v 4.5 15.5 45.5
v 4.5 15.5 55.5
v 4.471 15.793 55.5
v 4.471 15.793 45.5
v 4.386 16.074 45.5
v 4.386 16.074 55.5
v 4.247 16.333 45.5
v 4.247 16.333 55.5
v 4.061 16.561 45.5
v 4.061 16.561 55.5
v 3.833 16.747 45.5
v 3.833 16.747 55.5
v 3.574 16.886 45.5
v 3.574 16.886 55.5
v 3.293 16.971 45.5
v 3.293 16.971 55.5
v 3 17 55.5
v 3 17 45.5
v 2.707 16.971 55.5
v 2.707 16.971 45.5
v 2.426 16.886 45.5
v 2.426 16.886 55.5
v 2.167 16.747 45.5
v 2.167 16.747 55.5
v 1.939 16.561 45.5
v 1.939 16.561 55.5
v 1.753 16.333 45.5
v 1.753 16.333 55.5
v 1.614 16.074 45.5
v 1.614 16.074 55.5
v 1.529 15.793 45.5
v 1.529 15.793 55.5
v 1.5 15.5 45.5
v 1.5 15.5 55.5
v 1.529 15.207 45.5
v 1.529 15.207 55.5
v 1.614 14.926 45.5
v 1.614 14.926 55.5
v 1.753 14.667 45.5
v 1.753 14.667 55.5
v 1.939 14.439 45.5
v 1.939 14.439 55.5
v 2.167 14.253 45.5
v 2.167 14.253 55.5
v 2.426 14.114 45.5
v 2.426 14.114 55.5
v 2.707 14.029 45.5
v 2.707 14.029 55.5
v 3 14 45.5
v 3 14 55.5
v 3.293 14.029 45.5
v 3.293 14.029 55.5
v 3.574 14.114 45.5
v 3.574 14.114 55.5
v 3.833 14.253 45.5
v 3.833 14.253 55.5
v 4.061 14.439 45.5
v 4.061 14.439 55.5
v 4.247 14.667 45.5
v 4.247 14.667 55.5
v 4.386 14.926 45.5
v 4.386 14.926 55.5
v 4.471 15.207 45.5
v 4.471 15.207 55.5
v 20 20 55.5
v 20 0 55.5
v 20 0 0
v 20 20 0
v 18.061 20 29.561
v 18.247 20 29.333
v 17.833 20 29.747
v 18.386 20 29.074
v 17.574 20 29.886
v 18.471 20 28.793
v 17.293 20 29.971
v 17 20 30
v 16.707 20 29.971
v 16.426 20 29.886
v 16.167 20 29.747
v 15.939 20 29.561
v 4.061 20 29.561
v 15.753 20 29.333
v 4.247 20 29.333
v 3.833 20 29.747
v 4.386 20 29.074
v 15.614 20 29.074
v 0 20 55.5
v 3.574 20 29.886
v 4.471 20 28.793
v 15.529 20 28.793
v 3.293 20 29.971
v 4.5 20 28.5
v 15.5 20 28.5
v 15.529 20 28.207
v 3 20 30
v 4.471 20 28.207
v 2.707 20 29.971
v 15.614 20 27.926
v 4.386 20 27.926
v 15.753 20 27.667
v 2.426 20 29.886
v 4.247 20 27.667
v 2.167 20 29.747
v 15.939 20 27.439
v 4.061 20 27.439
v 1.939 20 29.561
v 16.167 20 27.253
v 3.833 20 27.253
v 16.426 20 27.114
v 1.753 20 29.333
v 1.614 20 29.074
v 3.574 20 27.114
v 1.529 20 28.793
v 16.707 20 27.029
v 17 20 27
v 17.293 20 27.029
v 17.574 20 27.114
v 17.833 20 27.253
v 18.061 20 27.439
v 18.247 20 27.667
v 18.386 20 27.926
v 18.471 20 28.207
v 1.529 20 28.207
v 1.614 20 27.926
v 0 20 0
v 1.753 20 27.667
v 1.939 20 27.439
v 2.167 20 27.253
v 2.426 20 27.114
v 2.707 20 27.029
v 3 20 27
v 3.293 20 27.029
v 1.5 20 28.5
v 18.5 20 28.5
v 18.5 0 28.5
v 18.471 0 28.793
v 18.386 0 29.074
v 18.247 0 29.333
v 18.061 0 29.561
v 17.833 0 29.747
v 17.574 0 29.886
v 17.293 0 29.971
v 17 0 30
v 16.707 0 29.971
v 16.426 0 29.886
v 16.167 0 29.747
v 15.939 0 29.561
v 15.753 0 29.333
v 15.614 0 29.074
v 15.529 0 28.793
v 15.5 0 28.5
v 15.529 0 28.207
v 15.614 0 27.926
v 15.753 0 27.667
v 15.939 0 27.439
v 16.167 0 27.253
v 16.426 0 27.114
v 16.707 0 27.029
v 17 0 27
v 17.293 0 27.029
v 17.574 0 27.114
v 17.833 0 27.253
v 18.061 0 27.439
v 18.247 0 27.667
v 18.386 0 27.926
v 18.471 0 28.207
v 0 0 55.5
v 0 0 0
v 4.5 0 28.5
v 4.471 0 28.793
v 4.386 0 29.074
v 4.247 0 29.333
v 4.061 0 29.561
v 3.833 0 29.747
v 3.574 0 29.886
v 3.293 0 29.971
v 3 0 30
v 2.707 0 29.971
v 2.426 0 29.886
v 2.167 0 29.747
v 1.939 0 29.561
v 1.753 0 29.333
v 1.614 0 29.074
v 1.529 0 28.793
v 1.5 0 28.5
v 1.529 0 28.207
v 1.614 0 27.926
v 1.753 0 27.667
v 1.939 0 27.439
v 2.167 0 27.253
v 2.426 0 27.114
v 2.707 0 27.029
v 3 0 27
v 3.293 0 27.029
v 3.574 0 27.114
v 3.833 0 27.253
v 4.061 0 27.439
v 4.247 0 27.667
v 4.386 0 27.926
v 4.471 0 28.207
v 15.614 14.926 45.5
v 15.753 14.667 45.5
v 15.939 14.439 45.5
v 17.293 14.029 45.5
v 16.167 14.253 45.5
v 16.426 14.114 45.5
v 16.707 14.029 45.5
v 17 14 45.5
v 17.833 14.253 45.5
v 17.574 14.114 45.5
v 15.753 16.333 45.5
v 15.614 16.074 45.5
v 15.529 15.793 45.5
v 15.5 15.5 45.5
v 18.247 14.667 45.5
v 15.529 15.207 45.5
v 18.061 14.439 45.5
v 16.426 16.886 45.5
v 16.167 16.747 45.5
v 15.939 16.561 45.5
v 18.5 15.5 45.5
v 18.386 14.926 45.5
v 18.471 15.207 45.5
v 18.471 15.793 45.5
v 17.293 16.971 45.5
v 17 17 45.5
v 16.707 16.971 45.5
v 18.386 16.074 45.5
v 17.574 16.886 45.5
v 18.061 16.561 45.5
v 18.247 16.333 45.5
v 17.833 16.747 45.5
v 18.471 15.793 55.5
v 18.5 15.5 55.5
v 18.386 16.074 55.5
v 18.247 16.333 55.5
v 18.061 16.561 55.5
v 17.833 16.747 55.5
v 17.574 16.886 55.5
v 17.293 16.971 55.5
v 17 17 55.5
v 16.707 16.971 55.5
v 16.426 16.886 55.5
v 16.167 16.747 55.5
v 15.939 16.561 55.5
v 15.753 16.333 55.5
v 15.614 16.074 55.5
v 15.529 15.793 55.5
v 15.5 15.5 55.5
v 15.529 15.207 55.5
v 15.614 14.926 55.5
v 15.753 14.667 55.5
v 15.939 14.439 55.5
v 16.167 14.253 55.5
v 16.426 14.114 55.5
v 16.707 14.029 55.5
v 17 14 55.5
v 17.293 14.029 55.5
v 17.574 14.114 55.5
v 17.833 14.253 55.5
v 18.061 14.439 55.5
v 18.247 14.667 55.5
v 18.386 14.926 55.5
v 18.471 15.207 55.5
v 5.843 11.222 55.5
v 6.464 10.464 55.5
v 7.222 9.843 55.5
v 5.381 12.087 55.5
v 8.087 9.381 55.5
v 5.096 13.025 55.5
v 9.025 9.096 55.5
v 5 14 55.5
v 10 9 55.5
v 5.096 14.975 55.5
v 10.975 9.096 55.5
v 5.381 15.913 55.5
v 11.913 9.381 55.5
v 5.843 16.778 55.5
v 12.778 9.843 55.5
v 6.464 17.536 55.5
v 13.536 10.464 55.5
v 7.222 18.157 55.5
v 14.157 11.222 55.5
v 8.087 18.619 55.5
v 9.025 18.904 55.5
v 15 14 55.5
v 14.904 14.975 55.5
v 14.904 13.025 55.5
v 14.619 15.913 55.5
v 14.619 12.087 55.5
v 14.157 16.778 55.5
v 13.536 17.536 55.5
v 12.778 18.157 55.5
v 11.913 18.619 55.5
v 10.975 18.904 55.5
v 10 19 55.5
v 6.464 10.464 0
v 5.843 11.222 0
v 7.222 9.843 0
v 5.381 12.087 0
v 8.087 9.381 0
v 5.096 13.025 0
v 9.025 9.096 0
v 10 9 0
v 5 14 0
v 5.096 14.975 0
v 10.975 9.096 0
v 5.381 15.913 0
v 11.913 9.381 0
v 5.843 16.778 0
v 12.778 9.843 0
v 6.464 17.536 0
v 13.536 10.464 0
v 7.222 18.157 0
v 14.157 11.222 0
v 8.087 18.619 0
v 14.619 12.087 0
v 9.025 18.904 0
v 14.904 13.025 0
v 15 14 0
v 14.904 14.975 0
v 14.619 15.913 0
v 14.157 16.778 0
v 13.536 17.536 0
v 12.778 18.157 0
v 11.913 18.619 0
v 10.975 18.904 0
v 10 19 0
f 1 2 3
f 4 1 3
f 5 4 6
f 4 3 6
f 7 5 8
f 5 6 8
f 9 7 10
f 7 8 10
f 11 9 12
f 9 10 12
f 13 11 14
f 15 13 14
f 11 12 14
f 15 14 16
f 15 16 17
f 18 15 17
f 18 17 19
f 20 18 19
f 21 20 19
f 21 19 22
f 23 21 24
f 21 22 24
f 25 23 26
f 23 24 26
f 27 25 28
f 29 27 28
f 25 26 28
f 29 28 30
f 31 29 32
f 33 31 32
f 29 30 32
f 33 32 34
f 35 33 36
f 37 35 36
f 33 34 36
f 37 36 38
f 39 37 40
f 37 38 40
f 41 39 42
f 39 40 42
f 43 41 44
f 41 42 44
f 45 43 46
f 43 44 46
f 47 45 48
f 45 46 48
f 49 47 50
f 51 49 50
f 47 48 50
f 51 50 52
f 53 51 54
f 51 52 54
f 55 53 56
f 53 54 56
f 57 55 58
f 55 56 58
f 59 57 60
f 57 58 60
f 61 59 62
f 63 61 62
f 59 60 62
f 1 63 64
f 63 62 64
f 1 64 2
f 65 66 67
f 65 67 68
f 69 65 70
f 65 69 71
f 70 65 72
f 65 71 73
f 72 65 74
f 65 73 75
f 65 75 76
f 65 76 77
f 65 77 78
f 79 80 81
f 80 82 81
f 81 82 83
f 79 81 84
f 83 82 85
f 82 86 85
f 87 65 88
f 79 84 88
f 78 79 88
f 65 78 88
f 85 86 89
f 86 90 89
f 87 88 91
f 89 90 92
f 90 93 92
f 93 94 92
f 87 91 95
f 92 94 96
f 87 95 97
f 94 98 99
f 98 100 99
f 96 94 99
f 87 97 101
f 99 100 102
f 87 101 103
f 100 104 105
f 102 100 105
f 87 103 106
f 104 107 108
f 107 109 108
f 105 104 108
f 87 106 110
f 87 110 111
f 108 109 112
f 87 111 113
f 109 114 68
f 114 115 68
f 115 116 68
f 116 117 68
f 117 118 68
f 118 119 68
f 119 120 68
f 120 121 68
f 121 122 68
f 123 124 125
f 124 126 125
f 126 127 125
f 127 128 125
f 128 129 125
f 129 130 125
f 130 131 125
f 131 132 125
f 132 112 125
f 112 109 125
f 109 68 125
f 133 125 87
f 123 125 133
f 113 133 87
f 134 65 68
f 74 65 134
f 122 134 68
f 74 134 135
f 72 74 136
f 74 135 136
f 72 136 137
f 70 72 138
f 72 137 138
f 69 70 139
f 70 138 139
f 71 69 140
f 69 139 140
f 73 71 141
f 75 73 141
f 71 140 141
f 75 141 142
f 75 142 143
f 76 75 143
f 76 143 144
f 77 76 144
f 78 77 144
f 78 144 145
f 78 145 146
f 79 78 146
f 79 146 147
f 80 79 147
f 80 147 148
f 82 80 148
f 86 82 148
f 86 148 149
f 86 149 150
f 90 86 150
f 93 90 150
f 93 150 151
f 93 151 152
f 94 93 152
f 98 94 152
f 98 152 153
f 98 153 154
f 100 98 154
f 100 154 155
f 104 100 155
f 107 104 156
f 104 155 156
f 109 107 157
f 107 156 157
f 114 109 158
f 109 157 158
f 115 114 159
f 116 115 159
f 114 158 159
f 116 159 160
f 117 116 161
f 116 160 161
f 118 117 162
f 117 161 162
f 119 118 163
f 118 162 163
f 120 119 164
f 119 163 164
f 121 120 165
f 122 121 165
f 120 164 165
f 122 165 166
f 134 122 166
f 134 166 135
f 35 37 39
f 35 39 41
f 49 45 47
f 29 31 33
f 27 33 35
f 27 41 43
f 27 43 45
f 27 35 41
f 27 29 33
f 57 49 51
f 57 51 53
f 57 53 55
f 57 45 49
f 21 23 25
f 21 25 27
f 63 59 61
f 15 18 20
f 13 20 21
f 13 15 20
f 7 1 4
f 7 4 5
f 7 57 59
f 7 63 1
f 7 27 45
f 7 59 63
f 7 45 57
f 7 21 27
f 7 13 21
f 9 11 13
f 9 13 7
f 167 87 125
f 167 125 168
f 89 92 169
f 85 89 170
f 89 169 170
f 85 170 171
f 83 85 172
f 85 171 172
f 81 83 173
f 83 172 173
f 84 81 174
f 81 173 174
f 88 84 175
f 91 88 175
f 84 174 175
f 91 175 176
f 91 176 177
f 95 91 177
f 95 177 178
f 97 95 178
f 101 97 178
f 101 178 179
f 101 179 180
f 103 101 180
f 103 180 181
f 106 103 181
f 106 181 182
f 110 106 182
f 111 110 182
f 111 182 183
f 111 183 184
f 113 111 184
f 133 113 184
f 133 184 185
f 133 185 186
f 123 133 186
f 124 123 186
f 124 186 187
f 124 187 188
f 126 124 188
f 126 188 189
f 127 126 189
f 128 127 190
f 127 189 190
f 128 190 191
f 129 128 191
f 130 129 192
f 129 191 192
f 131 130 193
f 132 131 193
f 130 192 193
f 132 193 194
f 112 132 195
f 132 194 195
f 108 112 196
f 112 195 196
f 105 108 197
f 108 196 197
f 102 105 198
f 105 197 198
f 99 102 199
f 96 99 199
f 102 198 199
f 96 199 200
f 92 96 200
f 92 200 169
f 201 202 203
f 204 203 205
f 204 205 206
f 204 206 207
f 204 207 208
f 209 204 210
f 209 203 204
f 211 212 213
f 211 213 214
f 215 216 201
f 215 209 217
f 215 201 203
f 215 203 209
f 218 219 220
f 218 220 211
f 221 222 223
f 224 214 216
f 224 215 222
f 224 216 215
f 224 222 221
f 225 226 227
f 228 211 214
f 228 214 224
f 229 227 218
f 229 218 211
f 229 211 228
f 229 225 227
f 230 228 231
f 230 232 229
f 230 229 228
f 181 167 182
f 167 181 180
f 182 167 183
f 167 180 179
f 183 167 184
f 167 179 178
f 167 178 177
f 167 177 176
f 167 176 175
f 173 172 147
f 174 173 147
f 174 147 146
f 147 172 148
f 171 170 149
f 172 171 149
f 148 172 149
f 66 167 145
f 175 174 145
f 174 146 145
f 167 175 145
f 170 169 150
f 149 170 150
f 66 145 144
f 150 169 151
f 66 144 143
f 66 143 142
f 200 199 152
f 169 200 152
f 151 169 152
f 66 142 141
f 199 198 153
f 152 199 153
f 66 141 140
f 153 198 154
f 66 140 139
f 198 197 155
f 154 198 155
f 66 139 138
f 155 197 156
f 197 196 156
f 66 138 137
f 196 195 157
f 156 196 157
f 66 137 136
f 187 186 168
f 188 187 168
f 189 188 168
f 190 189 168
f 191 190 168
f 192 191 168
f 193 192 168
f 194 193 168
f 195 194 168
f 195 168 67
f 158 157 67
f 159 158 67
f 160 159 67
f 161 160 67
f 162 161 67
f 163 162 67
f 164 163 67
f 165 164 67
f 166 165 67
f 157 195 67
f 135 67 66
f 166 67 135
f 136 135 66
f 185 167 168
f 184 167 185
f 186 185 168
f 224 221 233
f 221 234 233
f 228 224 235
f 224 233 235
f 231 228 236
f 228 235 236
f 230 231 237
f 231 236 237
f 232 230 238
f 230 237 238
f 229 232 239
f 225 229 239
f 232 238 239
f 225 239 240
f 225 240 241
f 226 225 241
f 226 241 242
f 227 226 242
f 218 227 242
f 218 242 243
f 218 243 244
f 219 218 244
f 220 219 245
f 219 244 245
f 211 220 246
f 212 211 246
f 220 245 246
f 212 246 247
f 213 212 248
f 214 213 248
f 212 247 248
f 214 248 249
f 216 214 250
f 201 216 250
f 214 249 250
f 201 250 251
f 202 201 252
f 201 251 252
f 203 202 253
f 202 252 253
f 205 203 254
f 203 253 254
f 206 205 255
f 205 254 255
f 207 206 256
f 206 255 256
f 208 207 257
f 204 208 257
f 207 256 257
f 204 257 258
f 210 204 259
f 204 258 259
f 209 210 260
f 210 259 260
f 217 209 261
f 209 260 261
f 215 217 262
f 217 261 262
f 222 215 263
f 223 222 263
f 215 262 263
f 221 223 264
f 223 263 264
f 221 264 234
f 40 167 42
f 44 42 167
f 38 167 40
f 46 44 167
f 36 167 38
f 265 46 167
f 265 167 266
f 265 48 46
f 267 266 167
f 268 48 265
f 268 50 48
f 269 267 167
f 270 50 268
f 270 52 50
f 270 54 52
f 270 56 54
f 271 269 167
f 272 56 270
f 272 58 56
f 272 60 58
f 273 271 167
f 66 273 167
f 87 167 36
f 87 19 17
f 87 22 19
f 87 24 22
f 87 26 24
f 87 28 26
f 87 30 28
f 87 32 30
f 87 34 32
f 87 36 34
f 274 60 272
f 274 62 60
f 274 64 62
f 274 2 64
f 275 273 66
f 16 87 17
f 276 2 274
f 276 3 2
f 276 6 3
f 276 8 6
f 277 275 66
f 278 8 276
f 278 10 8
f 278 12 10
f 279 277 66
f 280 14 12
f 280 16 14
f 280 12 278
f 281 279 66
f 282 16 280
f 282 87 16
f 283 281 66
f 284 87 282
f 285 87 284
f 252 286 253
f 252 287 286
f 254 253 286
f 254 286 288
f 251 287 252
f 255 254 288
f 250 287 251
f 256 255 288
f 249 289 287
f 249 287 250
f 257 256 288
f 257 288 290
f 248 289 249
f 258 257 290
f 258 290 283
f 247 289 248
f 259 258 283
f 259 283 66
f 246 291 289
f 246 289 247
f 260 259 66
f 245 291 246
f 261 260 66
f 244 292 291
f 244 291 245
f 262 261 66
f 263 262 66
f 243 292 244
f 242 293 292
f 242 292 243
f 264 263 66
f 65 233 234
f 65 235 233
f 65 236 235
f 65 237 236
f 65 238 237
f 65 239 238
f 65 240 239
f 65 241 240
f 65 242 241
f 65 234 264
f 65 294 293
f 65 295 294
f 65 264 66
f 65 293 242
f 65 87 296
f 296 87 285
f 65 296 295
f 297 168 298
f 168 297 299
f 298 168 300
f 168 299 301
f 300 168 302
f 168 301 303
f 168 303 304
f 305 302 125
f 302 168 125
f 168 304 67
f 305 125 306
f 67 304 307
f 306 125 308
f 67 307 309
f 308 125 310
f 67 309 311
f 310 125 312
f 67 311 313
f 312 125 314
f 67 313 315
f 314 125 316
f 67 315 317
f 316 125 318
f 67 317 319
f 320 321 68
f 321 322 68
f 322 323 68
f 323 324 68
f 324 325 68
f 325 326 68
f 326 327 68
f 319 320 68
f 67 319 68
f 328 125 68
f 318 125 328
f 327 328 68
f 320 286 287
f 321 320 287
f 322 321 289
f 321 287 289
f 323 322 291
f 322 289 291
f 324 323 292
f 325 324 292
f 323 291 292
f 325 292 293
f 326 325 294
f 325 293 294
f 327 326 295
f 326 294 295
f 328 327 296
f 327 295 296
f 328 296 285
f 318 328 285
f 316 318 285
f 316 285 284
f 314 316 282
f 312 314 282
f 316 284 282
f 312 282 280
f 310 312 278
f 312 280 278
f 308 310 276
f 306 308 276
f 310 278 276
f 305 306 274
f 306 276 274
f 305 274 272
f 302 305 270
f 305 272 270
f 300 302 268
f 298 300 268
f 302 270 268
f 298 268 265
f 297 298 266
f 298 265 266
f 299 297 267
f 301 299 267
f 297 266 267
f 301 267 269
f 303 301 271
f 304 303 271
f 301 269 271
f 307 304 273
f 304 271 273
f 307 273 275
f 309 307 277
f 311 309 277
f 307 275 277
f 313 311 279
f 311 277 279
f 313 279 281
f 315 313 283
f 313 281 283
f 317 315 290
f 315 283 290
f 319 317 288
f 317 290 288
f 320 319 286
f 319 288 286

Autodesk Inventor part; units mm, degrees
ref_plane "YZ Plane" through (0, 0, 0) normal (1, 0, 0) x (0, 1, 0)
ref_plane "XZ Plane" through (0, 0, 0) normal (0, 1, 0) x (-1, 0, 0)
ref_plane "XY Plane" through (0, 0, 0) normal (0, 0, 1) x (1, 0, 0)
sketch "Sketch1" plane through (0, 0, 0) normal (0, 0, 1) x (1, 0, 0)
  line L0 (0, 0) -> (20, 0)
  line L1 (20, 0) -> (20, 20)
  line L2 (20, 20) -> (0, 20)
  line L3 (0, 20) -> (0, 0)
  dimension "d0" = 20
  dimension "d1" = 20
extrude "Extrusion1" add sketch "Sketch1" along normal blind 55.5
sketch "Sketch2" plane through (0, 0, 0) normal (0, -1, 0) x (1, 0, 0)
  circle A0 centre (17, 28.5) radius 1.5
  circle A1 centre (3, 28.5) radius 1.5
  line L0 (0, 0) -> (20, 0) projected
  dimension "d4" = 14
  dimension "d5" = 3
  dimension "d6" = 28.5
  dimension "d7" = 3
  dimension "d8" = 3
extrude "Extrusion2" cut sketch "Sketch2" against normal through all
sketch "Sketch3" plane through (0, 0, 55.5) normal (0, 0, 1) x (1, 0, 0)
  circle A0 centre (17, 15.5) radius 1.5
  circle A1 centre (3, 15.5) radius 1.5
  line L0 (0, 20) -> (0, 0) projected
  line L1 (20, 0) -> (20, 20) projected
  line L2 (20, 20) -> (0, 20) projected
  dimension "d11" = 3
  dimension "d12" = 3
  dimension "d13" = 14
  dimension "d14" = 3
  dimension "d15" = 3
  dimension "d22" = 4.5
extrude "Extrusion3" cut sketch "Sketch3" against normal blind 10
sketch "Sketch4" plane through (0, 0, 55.5) normal (0, 0, 1) x (1, 0, 0)
  circle A0 centre (10, 14) radius 5
  line L0 (20, 20) -> (0, 20) projected
  point P0 (0, 0)
  point P1 (10, 20)
  dimension "d18" = 6
  dimension "d19" = 10
extrude "Extrusion4" cut sketch "Sketch4" against normal through all
sketch "Sketch5" plane through (0, 20, 0) normal (0, 1, 0) x (1, 0, 0)
  point P0 (0, 0)
properties part number "BLOQUE_PRESION"
